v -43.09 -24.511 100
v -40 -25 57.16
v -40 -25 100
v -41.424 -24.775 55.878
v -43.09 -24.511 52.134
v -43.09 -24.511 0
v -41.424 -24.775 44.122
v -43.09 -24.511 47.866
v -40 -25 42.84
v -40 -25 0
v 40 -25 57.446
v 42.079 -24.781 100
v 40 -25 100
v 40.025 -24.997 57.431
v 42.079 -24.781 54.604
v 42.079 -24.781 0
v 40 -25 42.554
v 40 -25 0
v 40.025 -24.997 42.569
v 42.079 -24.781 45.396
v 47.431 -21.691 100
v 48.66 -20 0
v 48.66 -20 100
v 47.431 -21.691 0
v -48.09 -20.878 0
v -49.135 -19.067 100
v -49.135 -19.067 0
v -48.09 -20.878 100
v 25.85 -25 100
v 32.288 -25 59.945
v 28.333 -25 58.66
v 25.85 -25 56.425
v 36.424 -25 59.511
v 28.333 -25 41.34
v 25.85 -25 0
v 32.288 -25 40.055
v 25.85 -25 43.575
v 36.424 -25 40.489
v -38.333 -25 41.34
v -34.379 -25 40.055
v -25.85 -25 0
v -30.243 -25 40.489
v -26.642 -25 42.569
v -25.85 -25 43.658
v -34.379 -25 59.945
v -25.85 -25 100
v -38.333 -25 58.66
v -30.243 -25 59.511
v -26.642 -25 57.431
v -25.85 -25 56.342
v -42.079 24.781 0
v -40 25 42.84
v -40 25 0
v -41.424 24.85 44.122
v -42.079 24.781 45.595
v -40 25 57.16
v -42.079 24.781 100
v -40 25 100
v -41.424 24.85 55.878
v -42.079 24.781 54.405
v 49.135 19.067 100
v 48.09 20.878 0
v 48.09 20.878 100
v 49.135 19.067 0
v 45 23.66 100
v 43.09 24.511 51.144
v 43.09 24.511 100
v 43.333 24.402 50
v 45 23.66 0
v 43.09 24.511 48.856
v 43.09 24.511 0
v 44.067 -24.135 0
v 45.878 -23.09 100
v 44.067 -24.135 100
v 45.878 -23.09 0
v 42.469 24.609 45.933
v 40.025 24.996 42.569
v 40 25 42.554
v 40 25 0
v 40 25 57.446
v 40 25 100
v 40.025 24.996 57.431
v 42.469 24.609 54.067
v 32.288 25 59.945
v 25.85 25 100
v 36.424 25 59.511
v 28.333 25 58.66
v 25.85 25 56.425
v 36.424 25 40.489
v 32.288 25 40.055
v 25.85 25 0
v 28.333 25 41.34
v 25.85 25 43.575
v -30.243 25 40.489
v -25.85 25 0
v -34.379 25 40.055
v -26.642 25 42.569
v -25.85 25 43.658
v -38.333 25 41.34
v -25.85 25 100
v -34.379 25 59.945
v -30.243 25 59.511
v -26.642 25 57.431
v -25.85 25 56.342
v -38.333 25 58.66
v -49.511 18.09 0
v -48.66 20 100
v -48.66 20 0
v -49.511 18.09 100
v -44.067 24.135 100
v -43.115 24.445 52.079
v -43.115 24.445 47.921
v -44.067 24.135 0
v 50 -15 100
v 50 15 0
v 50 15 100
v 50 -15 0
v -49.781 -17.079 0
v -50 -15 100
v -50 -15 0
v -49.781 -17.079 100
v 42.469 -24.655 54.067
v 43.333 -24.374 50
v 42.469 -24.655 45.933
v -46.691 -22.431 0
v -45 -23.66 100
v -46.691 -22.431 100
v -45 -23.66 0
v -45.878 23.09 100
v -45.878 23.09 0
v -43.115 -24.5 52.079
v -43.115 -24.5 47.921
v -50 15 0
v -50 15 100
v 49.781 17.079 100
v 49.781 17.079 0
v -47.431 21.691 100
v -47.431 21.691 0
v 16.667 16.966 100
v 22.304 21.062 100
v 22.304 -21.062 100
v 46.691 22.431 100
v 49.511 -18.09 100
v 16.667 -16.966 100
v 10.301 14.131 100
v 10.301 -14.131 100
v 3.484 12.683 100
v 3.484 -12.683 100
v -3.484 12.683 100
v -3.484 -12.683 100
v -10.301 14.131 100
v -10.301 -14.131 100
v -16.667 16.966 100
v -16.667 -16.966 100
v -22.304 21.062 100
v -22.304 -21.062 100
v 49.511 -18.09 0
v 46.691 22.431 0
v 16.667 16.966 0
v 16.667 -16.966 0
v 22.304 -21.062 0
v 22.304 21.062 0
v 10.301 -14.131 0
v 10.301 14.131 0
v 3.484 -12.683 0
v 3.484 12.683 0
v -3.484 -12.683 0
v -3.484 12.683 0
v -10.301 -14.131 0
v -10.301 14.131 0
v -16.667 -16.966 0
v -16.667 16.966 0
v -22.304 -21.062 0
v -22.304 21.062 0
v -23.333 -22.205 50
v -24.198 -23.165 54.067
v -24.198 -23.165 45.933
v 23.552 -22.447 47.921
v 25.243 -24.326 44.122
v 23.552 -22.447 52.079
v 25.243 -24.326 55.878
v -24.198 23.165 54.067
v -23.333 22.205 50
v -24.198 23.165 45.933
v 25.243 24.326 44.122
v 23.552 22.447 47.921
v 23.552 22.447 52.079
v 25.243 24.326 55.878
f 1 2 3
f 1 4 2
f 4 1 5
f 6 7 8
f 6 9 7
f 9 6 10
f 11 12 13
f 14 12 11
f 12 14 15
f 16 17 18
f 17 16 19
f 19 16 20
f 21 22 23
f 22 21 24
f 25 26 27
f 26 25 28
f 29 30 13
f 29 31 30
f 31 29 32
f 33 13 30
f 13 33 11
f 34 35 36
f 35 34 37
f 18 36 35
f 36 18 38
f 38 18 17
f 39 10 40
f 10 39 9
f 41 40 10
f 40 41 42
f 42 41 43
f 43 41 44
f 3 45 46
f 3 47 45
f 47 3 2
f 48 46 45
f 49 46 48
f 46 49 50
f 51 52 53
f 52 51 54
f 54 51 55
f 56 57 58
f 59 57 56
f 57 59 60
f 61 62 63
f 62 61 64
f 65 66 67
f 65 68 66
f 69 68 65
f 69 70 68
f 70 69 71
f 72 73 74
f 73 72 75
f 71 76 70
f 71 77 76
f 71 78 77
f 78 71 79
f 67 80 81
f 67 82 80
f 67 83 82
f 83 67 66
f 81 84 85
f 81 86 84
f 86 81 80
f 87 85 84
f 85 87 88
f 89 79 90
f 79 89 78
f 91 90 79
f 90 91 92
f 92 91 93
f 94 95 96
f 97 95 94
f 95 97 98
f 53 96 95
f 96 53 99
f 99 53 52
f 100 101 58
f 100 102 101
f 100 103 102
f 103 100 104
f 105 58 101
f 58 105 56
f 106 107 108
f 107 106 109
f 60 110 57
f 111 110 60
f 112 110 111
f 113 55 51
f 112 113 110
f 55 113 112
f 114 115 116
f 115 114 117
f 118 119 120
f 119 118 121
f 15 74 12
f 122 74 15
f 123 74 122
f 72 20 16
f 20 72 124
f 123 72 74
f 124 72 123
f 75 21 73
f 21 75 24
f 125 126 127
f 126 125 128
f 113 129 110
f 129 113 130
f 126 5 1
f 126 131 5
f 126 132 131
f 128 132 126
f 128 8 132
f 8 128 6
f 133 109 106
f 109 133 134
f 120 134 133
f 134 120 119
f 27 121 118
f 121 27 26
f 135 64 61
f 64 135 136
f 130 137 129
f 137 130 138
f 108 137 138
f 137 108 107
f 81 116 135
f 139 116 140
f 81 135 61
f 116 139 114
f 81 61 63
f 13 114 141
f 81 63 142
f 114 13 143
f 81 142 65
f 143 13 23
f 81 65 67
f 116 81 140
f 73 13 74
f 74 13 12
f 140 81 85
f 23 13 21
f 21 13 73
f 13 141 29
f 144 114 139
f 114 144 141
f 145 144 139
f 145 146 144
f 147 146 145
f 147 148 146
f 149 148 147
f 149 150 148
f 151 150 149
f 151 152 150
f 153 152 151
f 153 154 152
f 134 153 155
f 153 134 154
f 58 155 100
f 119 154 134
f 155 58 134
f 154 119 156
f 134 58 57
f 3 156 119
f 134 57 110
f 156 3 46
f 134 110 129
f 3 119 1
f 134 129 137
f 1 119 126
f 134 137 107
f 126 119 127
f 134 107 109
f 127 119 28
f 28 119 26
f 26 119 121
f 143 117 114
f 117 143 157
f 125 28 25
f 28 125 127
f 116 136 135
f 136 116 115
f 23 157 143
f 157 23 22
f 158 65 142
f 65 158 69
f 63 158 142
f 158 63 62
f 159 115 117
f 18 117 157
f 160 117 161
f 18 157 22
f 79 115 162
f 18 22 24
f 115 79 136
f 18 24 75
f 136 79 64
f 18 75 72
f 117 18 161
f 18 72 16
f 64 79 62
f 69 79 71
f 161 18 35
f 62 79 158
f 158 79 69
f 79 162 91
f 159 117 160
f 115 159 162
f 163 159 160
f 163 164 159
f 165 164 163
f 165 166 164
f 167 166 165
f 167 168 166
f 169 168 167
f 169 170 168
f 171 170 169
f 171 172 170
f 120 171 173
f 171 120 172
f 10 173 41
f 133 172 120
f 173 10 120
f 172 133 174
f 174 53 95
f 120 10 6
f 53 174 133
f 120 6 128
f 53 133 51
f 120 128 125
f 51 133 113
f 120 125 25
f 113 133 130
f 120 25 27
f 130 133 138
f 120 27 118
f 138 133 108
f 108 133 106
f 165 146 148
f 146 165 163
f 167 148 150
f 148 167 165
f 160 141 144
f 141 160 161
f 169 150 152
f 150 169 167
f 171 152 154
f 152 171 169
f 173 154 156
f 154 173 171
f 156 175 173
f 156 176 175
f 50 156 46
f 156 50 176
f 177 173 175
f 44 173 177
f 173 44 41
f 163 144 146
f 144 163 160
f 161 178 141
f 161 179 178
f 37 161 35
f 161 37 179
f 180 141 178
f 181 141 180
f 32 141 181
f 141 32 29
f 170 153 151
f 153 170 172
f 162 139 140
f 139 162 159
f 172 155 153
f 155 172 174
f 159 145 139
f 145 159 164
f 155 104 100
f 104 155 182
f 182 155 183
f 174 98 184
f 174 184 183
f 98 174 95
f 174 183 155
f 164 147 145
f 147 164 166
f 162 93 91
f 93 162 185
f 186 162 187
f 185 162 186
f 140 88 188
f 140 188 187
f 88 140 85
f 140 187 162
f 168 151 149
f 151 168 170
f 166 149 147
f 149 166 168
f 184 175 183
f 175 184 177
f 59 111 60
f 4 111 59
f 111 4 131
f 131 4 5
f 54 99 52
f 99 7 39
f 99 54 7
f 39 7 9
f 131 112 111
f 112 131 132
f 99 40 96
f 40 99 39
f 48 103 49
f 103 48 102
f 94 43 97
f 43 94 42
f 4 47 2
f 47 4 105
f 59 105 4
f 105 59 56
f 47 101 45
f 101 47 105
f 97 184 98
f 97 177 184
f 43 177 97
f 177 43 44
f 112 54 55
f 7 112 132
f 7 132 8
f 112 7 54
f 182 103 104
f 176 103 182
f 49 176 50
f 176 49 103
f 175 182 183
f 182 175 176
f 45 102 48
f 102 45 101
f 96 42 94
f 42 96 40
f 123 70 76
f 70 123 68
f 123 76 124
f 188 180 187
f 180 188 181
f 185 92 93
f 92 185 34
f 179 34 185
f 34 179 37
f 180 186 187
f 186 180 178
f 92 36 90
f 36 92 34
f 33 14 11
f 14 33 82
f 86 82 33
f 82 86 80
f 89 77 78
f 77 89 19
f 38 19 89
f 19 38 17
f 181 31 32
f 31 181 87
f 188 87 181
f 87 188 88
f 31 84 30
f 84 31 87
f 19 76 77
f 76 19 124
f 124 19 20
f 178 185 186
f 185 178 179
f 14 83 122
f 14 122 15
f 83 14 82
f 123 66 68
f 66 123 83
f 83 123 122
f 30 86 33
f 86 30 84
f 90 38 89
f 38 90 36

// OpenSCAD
epsilon = 0.1;

barilla_longitud = 300;
barilla_radio    =  10;

idle_radius =  10;
idle_width  = 100;
idle_depth  =  50;
idle_height = 100;

idle_cut_radius = idle_width/3;

motor_diameter = 10;
motor_height   = 10;

motor();
idle();

module motor() {
  color("gray")
    cylinder(r=motor_diameter/2,
             h=motor_height)  ;
}

module idle() {
  difference() {
    idle_body();
    translate([-idle_width/3,0,idle_height/2])
      barilla();
    translate([ idle_width/3,0,idle_height/2])
      barilla();
  }
}

module idle_body() {
  difference() {
    linear_extrude(idle_height)
      offset(r=idle_radius)
        square([idle_width-(idle_radius*2),
                idle_depth-(idle_radius*2)],
               center=true);
    translate([0,-idle_cut_radius - idle_depth/4,-epsilon])
      linear_extrude(idle_height + epsilon*2)
        circle(r=idle_cut_radius);
    translate([0, idle_cut_radius + idle_depth/4,-epsilon])
      linear_extrude(idle_height + epsilon*2)
        circle(r=idle_cut_radius);
  }
}

module barilla() {
  rotate([90,0,0])
    linear_extrude(barilla_longitud, center=true)
      circle(barilla_radio, $fn=15);
}
